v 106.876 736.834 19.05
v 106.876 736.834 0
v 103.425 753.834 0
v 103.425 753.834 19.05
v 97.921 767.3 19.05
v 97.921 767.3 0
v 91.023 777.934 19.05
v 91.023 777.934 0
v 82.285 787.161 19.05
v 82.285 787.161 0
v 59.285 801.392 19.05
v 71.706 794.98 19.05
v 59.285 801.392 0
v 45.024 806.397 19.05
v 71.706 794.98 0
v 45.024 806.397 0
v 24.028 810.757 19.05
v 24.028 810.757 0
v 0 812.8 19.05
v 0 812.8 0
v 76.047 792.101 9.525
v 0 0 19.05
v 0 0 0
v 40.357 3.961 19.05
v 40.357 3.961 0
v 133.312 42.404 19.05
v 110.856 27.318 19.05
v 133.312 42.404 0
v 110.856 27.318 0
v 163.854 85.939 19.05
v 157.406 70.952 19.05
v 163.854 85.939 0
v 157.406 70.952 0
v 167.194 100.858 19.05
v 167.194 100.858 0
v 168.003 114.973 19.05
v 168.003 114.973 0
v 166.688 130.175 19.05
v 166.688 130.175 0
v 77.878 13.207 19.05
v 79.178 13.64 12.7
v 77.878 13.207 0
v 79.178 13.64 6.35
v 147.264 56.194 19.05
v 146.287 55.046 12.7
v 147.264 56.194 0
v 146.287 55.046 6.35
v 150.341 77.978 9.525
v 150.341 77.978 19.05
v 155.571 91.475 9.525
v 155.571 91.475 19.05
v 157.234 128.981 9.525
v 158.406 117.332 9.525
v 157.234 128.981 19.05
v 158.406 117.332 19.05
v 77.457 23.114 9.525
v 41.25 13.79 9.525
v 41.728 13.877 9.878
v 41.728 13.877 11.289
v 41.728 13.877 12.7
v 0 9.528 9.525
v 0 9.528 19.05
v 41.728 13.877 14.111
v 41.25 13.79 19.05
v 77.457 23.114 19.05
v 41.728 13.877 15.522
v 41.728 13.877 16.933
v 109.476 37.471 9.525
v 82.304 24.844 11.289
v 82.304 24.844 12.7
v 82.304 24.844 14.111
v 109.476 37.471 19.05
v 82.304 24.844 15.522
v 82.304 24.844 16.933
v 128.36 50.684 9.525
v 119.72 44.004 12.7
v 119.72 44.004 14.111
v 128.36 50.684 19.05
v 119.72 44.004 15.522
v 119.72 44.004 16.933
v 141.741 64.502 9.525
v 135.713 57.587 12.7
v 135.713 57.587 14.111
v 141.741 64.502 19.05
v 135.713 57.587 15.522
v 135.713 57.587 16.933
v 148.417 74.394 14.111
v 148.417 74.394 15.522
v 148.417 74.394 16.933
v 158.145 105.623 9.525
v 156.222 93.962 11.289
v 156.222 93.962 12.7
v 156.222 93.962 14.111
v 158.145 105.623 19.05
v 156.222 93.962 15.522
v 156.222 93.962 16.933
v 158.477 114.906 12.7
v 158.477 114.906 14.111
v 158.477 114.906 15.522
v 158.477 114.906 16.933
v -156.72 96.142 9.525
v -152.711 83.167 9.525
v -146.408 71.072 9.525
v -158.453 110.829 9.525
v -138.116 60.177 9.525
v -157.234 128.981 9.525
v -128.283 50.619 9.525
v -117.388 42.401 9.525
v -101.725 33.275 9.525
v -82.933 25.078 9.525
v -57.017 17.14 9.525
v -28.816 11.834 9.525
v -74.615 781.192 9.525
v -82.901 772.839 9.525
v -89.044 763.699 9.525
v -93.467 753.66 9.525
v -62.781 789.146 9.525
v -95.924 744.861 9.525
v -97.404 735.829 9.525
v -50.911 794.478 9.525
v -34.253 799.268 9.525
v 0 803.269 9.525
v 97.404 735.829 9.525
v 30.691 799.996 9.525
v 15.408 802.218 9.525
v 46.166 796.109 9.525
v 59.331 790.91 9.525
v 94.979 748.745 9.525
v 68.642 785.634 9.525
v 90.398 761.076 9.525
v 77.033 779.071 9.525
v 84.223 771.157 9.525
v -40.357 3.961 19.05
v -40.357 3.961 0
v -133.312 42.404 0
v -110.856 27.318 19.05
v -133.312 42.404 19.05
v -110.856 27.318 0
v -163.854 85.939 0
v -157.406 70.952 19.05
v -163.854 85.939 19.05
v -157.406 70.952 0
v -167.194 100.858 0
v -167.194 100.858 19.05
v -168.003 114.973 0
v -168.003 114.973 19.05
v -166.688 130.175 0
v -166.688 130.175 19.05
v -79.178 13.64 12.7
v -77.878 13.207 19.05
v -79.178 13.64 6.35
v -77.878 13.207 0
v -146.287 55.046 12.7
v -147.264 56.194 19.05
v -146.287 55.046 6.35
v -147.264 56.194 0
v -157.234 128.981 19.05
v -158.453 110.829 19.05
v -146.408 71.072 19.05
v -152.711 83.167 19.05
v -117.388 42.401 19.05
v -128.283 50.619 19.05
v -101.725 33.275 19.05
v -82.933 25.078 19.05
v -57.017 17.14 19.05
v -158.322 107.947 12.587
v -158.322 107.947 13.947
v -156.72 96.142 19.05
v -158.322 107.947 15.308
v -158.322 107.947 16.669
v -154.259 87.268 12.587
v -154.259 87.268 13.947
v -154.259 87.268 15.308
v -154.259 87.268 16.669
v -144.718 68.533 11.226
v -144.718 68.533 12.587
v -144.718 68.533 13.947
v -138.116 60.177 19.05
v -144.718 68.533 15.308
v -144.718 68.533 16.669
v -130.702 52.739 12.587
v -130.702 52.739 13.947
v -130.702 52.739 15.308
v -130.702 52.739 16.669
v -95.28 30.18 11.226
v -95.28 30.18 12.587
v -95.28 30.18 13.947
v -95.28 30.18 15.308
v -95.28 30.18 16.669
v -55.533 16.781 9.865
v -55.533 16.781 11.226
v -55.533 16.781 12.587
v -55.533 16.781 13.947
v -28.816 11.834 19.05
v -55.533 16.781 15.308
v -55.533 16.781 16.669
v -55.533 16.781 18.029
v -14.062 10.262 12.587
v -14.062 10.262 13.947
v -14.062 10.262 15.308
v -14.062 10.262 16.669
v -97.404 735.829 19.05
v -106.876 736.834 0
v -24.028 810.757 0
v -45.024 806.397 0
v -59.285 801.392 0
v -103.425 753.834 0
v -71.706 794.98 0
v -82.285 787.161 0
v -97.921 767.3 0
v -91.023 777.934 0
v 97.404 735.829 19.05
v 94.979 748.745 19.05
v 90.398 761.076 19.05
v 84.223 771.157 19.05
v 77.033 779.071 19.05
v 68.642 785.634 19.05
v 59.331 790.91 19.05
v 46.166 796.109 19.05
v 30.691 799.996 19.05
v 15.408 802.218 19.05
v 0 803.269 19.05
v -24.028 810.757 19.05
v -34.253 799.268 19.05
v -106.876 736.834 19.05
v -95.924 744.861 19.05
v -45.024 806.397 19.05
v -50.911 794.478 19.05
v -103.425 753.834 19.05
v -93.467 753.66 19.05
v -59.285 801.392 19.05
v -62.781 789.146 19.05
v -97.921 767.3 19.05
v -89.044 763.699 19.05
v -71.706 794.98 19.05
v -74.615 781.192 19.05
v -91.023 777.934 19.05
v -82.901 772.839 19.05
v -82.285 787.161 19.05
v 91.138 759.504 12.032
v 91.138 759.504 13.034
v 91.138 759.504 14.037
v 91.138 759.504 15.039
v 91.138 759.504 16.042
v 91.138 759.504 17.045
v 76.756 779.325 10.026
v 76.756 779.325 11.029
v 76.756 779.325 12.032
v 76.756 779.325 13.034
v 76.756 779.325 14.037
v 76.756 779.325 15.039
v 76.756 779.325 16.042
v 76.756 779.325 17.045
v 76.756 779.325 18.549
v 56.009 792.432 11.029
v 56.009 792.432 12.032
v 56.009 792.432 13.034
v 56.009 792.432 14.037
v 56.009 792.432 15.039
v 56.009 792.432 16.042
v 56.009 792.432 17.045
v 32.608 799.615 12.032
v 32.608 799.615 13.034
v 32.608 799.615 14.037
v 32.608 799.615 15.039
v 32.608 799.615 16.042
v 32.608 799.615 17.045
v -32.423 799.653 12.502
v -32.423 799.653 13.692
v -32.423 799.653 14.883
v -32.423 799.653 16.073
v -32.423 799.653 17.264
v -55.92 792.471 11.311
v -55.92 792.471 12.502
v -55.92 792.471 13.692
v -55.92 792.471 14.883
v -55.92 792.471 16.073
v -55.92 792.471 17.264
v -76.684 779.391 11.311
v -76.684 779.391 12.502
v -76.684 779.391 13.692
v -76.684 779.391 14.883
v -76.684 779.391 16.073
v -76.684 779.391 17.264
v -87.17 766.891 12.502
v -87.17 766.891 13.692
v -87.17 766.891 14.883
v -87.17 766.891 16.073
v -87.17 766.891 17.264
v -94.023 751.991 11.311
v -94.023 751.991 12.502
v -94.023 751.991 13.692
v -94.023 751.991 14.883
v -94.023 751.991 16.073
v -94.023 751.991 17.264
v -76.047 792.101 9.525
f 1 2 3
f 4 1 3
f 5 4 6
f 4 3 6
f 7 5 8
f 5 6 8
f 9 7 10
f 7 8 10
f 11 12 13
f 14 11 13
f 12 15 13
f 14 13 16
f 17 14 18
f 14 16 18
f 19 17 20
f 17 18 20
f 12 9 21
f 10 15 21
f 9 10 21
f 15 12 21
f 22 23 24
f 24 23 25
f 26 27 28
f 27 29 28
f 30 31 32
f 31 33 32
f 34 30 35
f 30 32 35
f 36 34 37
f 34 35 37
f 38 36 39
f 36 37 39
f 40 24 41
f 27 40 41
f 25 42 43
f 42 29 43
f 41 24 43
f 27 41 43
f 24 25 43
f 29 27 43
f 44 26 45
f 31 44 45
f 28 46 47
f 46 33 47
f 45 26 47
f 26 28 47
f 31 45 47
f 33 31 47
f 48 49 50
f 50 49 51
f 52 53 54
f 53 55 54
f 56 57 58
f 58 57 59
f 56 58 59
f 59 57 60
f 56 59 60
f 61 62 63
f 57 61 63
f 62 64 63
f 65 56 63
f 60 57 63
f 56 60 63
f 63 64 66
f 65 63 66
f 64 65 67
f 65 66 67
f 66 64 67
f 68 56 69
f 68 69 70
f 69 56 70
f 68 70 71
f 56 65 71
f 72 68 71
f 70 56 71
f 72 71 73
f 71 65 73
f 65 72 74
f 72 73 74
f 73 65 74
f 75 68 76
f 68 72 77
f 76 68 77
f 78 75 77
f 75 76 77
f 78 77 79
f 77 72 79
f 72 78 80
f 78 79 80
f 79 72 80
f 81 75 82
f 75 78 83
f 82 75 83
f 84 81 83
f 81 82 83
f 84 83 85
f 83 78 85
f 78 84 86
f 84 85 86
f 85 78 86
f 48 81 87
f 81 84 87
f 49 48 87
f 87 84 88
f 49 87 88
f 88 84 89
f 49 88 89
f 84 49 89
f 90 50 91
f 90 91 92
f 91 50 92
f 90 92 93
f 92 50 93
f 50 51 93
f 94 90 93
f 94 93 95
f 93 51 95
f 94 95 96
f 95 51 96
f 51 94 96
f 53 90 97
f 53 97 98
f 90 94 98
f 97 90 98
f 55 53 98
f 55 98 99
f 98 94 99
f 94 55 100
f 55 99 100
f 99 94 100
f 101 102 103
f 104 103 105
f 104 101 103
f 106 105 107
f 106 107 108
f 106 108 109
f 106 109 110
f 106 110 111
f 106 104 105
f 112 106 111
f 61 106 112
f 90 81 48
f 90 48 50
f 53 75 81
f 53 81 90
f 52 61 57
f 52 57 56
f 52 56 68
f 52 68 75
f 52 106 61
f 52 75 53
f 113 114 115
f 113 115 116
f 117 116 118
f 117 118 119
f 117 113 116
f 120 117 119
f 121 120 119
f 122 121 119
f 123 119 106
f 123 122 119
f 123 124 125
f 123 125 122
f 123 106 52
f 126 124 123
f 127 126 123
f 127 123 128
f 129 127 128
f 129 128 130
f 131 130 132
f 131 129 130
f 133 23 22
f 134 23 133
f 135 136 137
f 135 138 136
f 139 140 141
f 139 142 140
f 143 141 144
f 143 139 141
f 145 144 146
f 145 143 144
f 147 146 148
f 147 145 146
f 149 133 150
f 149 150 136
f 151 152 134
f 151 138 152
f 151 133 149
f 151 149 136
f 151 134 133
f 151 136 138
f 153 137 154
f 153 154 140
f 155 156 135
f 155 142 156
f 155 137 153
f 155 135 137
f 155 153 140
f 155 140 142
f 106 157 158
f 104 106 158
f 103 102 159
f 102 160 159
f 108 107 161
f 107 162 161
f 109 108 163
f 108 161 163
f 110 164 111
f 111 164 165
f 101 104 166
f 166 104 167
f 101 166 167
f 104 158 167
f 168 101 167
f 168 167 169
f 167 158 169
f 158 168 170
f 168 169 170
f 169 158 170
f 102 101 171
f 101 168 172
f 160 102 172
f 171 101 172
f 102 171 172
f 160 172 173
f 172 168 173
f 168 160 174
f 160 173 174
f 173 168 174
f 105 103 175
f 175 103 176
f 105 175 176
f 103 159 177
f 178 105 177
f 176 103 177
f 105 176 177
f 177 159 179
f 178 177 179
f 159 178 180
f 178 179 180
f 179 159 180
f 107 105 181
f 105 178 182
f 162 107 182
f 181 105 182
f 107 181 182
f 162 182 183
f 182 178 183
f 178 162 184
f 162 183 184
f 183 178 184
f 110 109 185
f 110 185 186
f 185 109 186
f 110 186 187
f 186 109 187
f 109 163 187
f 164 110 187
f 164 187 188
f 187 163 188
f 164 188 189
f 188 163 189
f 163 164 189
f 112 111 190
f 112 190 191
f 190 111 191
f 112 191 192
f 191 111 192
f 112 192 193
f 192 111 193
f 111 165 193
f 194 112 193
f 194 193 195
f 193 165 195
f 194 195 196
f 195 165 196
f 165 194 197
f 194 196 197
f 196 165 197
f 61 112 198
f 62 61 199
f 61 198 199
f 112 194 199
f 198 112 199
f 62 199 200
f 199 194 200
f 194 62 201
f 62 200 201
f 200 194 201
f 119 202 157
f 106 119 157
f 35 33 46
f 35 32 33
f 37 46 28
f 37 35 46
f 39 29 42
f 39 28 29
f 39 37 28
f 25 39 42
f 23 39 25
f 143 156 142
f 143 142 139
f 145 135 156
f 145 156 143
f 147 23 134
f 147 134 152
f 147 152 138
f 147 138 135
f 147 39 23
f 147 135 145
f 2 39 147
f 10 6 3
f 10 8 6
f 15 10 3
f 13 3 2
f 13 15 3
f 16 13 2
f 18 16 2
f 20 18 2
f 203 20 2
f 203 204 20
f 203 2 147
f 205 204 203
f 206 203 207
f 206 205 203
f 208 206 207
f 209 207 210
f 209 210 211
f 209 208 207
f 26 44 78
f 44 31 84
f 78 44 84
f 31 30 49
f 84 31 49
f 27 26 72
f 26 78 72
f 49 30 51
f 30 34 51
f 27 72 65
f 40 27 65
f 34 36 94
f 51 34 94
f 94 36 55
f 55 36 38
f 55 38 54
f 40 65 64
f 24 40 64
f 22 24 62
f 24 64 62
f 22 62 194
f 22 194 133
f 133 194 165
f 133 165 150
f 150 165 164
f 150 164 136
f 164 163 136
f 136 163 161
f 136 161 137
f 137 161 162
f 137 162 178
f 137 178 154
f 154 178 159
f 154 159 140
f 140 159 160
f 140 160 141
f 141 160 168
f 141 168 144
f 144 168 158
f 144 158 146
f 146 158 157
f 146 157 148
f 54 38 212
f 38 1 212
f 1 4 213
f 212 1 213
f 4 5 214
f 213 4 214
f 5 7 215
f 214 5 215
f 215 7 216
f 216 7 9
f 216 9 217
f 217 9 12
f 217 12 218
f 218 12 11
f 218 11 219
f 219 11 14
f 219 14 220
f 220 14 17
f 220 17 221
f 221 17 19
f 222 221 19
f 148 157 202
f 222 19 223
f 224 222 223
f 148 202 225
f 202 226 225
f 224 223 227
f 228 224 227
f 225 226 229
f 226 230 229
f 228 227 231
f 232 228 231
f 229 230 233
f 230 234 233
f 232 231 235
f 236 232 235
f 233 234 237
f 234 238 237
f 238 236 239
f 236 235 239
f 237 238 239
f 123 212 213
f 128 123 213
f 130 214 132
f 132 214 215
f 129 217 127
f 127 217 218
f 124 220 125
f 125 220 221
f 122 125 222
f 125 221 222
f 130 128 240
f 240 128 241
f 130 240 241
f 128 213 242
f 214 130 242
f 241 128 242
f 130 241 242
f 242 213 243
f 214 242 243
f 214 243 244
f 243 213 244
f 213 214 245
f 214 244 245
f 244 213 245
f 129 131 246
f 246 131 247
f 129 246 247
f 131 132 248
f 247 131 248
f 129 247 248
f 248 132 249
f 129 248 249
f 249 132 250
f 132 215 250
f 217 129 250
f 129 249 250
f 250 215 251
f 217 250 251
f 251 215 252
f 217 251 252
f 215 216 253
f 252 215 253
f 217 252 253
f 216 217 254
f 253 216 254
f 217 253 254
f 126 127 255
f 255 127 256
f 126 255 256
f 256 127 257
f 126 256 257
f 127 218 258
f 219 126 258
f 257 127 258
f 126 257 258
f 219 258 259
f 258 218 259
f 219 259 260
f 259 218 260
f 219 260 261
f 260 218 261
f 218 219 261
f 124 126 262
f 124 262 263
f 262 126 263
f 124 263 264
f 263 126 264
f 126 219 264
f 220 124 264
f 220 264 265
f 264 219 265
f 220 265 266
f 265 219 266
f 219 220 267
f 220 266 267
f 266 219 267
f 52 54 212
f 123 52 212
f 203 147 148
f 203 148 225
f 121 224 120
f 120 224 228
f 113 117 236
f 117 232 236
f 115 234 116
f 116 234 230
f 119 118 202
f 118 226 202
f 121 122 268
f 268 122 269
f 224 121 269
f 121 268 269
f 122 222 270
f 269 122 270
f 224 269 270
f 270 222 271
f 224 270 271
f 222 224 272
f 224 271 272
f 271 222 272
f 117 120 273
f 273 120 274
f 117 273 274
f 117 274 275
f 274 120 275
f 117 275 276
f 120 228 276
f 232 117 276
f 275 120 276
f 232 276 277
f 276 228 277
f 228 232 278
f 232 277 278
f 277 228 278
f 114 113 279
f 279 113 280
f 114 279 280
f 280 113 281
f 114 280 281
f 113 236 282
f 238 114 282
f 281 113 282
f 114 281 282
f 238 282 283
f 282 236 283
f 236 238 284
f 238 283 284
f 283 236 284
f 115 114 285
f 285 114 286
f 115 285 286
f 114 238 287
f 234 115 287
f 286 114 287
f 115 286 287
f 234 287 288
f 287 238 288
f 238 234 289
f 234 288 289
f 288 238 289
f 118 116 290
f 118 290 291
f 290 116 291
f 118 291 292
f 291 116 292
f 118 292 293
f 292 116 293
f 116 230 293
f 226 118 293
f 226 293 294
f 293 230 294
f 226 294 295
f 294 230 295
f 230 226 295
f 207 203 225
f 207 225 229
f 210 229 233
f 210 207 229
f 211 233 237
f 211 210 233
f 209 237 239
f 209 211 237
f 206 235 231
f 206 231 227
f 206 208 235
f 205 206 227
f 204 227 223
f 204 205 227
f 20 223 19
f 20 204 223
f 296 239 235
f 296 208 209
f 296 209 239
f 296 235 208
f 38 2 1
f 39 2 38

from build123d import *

# Parameters (mm, degrees)
BOSS_EXTRUDE1_DEPTH = 19.05
CUT_EXTRUDE1_DEPTH  = 9.525


with BuildPart() as part:
    # Sketch2 → Boss-Extrude1 (new body)
    with BuildSketch(Plane.XY):
        with BuildLine():
            Line((-166.6875, 130.175), (-106.876080835, 736.833680097))
            add(Edge.make_bspline(
                [(-106.876080835, 736.833680097), (-98.655564568, 809.385111394), (0, 812.8)],
                knots=[0, 0, 0, 1, 1, 1], degree=2))
            add(Edge.make_bspline(
                [(106.876080835, 736.833680097), (98.655564568, 809.385111394), (0, 812.8)],
                knots=[0, 0, 0, 1, 1, 1], degree=2))
            Line((106.876080835, 736.833680097), (166.6875, 130.175))
            add(Edge.make_bspline(
                [(0, 0), (73.666580622, 1.740675992), (181.188092361, 36.200835609), (166.6875, 130.175)],
                knots=[0, 0, 0, 0, 1, 1, 1, 1], degree=3))
            add(Edge.make_bspline(
                [(0, 0), (-73.666580622, 1.740675992), (-181.188092361, 36.200835609), (-166.6875, 130.175)],
                knots=[0, 0, 0, 0, 1, 1, 1, 1], degree=3))
        make_face()
    extrude(amount=BOSS_EXTRUDE1_DEPTH)

    # Sketch4 → Cut-Extrude1 (cut)
    with BuildSketch(Plane.XY.offset(19.05)):
        with BuildLine():
            Line((-97.403993572, 735.828587026), (-157.234081882, 128.980548454))
            add(Edge.make_bspline(
                [(-157.234081882, 128.980548454), (-157.324205492, 128.396483281), (-157.412089483, 127.812410477), (-157.576084777, 126.644224751), (-157.653279282, 126.06011552), (-157.870174292, 124.307737773), (-157.995189913, 123.139419215), (-158.309135667, 119.634255327), (-158.437031706, 117.29720201), (-158.555423917, 110.285138008), (-158.282055898, 105.60922815), (-157.411253292, 99.762537833), (-157.210017909, 98.591234632), (-156.757264158, 96.273926752), (-156.001688417, 92.827229864), (-155.017022207, 89.468234028), (-152.743005414, 82.866882475), (-150.82076111, 78.621496729), (-147.913058291, 73.508050792), (-147.306271331, 72.4950265), (-146.042259928, 70.488286534), (-145.389757898, 69.50206831), (-143.374427295, 66.59388241), (-141.953452439, 64.721702461), (-137.477795564, 59.288190671), (-134.211225834, 55.909160224), (-129.824716649, 51.946319201), (-128.932947118, 51.167642375), (-127.132093683, 49.645344246), (-126.221588539, 48.900422844), (-123.461599805, 46.711504594), (-121.583697089, 45.313266475), (-115.848105381, 41.282598746), (-111.889088448, 38.81332115), (-103.746143975, 34.236903166), (-99.561981891, 32.130140428), (-94.209825099, 29.693050126), (-93.132197949, 29.215042748), (-90.971456085, 28.280905266), (-89.888342715, 27.824742202), (-86.631139254, 26.48752268), (-84.44919675, 25.6376924), (-77.874418426, 23.203328361), (-73.452755763, 21.733428424), (-64.541987933, 19.061822744), (-60.052845479, 17.860265278), (-51.012964961, 15.702093584), (-46.462212797, 14.745535421), (-37.302169602, 13.065206786), (-32.692883998, 12.341414728), (-25.735345382, 11.429148513), (-23.408876198, 11.154048031), (-18.7411174, 10.662782498), (-16.401859715, 10.446870289), (-9.382680965, 9.891490593), (-4.695544036, 9.643012505), (0, 9.52776174)],
                knots=[0, 0, 0, 0, 0.0078125, 0.0078125, 0.015625, 0.015625, 0.03125, 0.03125, 0.0625, 0.0625, 0.125, 0.125, 0.140625, 0.140625, 0.15625, 0.1875, 0.1875, 0.25, 0.25, 0.265625, 0.265625, 0.28125, 0.28125, 0.3125, 0.3125, 0.375, 0.375, 0.390625, 0.390625, 0.40625, 0.40625, 0.4375, 0.4375, 0.5, 0.5, 0.5625, 0.5625, 0.578125, 0.578125, 0.59375, 0.59375, 0.625, 0.625, 0.6875, 0.6875, 0.75, 0.75, 0.8125, 0.8125, 0.875, 0.875, 0.90625, 0.90625, 0.9375, 0.9375, 1, 1, 1, 1], degree=3))
            add(Edge.make_bspline(
                [(0, 9.52776174), (4.696782429, 9.643042901), (9.371788605, 9.891241348), (18.682630774, 10.626724118), (23.318416438, 11.114315633), (32.552071373, 12.320931698), (37.149923971, 13.040058014), (46.306955275, 14.714367272), (50.866134292, 15.669548315), (59.943247261, 17.831660883), (64.461195673, 19.038504147), (71.20372728, 21.058683944), (73.447300549, 21.767866857), (77.898983356, 23.253348365), (80.109631224, 24.030343068), (86.693442252, 26.469842463), (91.018725741, 28.240292259), (99.522601409, 32.111908605), (103.70134125, 34.212742248), (108.81530232, 37.085571172), (109.832590209, 37.672546502), (111.855568511, 38.872643767), (112.862320589, 39.486453403), (115.852002601, 41.361553617), (117.806717627, 42.657699597), (123.546532273, 46.69530685), (127.208159374, 49.584908122), (132.403942543, 54.275234083), (134.0862339, 55.898228847), (136.526821296, 58.432122427), (137.326523938, 59.293342382), (138.896628692, 61.050936516), (139.668584954, 61.949275112), (143.422485376, 66.499587265), (146.099261927, 70.337793886), (149.575356296, 76.4220986), (150.644084323, 78.504775138), (152.10493938, 81.715069485), (152.568177575, 82.799551968), (153.44592623, 84.998074695), (153.858285185, 86.106992021), (155.77907965, 91.670668847), (156.87633236, 96.211033443), (157.917859106, 103.144578031), (158.164237879, 105.476273711), (158.388791016, 109.003330668), (158.439487754, 110.186052077), (158.493329725, 112.548388418), (158.496596004, 113.728050186), (158.438962094, 117.262741174), (158.31071539, 119.613481568), (157.996011579, 123.131801583), (157.87069881, 124.303275057), (157.58107101, 126.643738225), (157.414305379, 127.812571858), (157.234081882, 128.980548454)],
                knots=[0, 0, 0, 0, 0.0625, 0.0625, 0.125, 0.125, 0.1875, 0.1875, 0.25, 0.25, 0.3125, 0.3125, 0.34375, 0.34375, 0.375, 0.375, 0.4375, 0.4375, 0.5, 0.5, 0.515625, 0.515625, 0.53125, 0.53125, 0.5625, 0.5625, 0.625, 0.625, 0.65625, 0.65625, 0.671875, 0.671875, 0.6875, 0.6875, 0.75, 0.75, 0.78125, 0.78125, 0.796875, 0.796875, 0.8125, 0.8125, 0.875, 0.875, 0.90625, 0.90625, 0.921875, 0.921875, 0.9375, 0.9375, 0.96875, 0.96875, 0.984375, 0.984375, 1, 1, 1, 1], degree=3))
            Line((157.234081882, 128.980548454), (97.403993572, 735.828587022))
            add(Edge.make_bspline(
                [(97.403993572, 735.828587022), (97.092286958, 738.562982934), (96.669418738, 741.267379451), (95.570059645, 746.607726854), (94.893642768, 749.243697709), (93.247932944, 754.436600394), (92.278730315, 756.993556598), (90.853060681, 760.13195437), (90.557097177, 760.756799005), (89.94756396, 761.991267361), (89.633481965, 762.602053668), (88.66308079, 764.414924295), (87.978602457, 765.597517573), (85.810987946, 769.066265293), (84.213589669, 771.273330454), (81.584120863, 774.422394534), (80.668756062, 775.44517415), (79.236968861, 776.938685261), (78.749736274, 777.429849509), (77.763144525, 778.391567332), (77.262906247, 778.863062984), (72.700160744, 783.024790933), (68.215938322, 786.146253506), (62.187228676, 789.476997053), (60.964200371, 790.112025219), (58.502000457, 791.317342862), (57.260396611, 791.888985895), (53.506907039, 793.519234755), (50.966447444, 794.493467918), (43.248745942, 797.131746553), (37.976068957, 798.513992185), (31.266175529, 799.890277732), (29.917456906, 800.147831744), (27.218689157, 800.627892818), (25.867458716, 800.850662293), (21.808637288, 801.471016253), (19.095929317, 801.820768942), (10.940039087, 802.703953619), (5.479213552, 803.072462364), (2e-09, 803.26908628)],
                knots=[0, 0, 0, 0, 0.0625, 0.0625, 0.125, 0.125, 0.1875, 0.1875, 0.203125, 0.203125, 0.21875, 0.21875, 0.25, 0.25, 0.3125, 0.3125, 0.34375, 0.34375, 0.359375, 0.359375, 0.375, 0.375, 0.5, 0.5, 0.53125, 0.53125, 0.5625, 0.5625, 0.625, 0.625, 0.75, 0.75, 0.78125, 0.78125, 0.8125, 0.8125, 0.875, 0.875, 1, 1, 1, 1], degree=3))
            add(Edge.make_bspline(
                [(2e-09, 803.26908628), (-5.471123606, 803.072752675), (-10.913888363, 802.705230434), (-21.727709567, 801.537317666), (-27.098938668, 800.737969365), (-35.084786769, 799.110381206), (-37.734826452, 798.495958833), (-43.006804741, 797.097481507), (-45.628764384, 796.313553549), (-49.536321772, 794.984442323), (-50.832509452, 794.516370139), (-53.395578467, 793.531913824), (-54.664623053, 793.014810614), (-58.431517441, 791.383359846), (-60.889276194, 790.189166552), (-65.679911837, 787.552063988), (-68.012848984, 786.109274725), (-72.530602319, 782.928697006), (-74.672229275, 781.220279014), (-78.696640654, 777.560904851), (-80.581086505, 775.608725668), (-83.205841084, 772.486867934), (-84.047113279, 771.413989968), (-85.660763906, 769.202180872), (-86.433815235, 768.062175102), (-90.116138831, 762.204478677), (-92.353845254, 757.218061553), (-94.440219005, 750.683674858), (-94.821772855, 749.361651688), (-95.517065206, 746.688851322), (-95.829087041, 745.344622952), (-96.665508178, 741.295731389), (-97.091208587, 738.572442767), (-97.403993572, 735.828587026)],
                knots=[0, 0, 0, 0, 0.125, 0.125, 0.25, 0.25, 0.3125, 0.3125, 0.375, 0.375, 0.40625, 0.40625, 0.4375, 0.4375, 0.5, 0.5, 0.5625, 0.5625, 0.625, 0.625, 0.6875, 0.6875, 0.71875, 0.71875, 0.75, 0.75, 0.875, 0.875, 0.90625, 0.90625, 0.9375, 0.9375, 1, 1, 1, 1], degree=3))
        make_face()
    extrude(amount=-CUT_EXTRUDE1_DEPTH, mode=Mode.SUBTRACT)


solid = part.part
